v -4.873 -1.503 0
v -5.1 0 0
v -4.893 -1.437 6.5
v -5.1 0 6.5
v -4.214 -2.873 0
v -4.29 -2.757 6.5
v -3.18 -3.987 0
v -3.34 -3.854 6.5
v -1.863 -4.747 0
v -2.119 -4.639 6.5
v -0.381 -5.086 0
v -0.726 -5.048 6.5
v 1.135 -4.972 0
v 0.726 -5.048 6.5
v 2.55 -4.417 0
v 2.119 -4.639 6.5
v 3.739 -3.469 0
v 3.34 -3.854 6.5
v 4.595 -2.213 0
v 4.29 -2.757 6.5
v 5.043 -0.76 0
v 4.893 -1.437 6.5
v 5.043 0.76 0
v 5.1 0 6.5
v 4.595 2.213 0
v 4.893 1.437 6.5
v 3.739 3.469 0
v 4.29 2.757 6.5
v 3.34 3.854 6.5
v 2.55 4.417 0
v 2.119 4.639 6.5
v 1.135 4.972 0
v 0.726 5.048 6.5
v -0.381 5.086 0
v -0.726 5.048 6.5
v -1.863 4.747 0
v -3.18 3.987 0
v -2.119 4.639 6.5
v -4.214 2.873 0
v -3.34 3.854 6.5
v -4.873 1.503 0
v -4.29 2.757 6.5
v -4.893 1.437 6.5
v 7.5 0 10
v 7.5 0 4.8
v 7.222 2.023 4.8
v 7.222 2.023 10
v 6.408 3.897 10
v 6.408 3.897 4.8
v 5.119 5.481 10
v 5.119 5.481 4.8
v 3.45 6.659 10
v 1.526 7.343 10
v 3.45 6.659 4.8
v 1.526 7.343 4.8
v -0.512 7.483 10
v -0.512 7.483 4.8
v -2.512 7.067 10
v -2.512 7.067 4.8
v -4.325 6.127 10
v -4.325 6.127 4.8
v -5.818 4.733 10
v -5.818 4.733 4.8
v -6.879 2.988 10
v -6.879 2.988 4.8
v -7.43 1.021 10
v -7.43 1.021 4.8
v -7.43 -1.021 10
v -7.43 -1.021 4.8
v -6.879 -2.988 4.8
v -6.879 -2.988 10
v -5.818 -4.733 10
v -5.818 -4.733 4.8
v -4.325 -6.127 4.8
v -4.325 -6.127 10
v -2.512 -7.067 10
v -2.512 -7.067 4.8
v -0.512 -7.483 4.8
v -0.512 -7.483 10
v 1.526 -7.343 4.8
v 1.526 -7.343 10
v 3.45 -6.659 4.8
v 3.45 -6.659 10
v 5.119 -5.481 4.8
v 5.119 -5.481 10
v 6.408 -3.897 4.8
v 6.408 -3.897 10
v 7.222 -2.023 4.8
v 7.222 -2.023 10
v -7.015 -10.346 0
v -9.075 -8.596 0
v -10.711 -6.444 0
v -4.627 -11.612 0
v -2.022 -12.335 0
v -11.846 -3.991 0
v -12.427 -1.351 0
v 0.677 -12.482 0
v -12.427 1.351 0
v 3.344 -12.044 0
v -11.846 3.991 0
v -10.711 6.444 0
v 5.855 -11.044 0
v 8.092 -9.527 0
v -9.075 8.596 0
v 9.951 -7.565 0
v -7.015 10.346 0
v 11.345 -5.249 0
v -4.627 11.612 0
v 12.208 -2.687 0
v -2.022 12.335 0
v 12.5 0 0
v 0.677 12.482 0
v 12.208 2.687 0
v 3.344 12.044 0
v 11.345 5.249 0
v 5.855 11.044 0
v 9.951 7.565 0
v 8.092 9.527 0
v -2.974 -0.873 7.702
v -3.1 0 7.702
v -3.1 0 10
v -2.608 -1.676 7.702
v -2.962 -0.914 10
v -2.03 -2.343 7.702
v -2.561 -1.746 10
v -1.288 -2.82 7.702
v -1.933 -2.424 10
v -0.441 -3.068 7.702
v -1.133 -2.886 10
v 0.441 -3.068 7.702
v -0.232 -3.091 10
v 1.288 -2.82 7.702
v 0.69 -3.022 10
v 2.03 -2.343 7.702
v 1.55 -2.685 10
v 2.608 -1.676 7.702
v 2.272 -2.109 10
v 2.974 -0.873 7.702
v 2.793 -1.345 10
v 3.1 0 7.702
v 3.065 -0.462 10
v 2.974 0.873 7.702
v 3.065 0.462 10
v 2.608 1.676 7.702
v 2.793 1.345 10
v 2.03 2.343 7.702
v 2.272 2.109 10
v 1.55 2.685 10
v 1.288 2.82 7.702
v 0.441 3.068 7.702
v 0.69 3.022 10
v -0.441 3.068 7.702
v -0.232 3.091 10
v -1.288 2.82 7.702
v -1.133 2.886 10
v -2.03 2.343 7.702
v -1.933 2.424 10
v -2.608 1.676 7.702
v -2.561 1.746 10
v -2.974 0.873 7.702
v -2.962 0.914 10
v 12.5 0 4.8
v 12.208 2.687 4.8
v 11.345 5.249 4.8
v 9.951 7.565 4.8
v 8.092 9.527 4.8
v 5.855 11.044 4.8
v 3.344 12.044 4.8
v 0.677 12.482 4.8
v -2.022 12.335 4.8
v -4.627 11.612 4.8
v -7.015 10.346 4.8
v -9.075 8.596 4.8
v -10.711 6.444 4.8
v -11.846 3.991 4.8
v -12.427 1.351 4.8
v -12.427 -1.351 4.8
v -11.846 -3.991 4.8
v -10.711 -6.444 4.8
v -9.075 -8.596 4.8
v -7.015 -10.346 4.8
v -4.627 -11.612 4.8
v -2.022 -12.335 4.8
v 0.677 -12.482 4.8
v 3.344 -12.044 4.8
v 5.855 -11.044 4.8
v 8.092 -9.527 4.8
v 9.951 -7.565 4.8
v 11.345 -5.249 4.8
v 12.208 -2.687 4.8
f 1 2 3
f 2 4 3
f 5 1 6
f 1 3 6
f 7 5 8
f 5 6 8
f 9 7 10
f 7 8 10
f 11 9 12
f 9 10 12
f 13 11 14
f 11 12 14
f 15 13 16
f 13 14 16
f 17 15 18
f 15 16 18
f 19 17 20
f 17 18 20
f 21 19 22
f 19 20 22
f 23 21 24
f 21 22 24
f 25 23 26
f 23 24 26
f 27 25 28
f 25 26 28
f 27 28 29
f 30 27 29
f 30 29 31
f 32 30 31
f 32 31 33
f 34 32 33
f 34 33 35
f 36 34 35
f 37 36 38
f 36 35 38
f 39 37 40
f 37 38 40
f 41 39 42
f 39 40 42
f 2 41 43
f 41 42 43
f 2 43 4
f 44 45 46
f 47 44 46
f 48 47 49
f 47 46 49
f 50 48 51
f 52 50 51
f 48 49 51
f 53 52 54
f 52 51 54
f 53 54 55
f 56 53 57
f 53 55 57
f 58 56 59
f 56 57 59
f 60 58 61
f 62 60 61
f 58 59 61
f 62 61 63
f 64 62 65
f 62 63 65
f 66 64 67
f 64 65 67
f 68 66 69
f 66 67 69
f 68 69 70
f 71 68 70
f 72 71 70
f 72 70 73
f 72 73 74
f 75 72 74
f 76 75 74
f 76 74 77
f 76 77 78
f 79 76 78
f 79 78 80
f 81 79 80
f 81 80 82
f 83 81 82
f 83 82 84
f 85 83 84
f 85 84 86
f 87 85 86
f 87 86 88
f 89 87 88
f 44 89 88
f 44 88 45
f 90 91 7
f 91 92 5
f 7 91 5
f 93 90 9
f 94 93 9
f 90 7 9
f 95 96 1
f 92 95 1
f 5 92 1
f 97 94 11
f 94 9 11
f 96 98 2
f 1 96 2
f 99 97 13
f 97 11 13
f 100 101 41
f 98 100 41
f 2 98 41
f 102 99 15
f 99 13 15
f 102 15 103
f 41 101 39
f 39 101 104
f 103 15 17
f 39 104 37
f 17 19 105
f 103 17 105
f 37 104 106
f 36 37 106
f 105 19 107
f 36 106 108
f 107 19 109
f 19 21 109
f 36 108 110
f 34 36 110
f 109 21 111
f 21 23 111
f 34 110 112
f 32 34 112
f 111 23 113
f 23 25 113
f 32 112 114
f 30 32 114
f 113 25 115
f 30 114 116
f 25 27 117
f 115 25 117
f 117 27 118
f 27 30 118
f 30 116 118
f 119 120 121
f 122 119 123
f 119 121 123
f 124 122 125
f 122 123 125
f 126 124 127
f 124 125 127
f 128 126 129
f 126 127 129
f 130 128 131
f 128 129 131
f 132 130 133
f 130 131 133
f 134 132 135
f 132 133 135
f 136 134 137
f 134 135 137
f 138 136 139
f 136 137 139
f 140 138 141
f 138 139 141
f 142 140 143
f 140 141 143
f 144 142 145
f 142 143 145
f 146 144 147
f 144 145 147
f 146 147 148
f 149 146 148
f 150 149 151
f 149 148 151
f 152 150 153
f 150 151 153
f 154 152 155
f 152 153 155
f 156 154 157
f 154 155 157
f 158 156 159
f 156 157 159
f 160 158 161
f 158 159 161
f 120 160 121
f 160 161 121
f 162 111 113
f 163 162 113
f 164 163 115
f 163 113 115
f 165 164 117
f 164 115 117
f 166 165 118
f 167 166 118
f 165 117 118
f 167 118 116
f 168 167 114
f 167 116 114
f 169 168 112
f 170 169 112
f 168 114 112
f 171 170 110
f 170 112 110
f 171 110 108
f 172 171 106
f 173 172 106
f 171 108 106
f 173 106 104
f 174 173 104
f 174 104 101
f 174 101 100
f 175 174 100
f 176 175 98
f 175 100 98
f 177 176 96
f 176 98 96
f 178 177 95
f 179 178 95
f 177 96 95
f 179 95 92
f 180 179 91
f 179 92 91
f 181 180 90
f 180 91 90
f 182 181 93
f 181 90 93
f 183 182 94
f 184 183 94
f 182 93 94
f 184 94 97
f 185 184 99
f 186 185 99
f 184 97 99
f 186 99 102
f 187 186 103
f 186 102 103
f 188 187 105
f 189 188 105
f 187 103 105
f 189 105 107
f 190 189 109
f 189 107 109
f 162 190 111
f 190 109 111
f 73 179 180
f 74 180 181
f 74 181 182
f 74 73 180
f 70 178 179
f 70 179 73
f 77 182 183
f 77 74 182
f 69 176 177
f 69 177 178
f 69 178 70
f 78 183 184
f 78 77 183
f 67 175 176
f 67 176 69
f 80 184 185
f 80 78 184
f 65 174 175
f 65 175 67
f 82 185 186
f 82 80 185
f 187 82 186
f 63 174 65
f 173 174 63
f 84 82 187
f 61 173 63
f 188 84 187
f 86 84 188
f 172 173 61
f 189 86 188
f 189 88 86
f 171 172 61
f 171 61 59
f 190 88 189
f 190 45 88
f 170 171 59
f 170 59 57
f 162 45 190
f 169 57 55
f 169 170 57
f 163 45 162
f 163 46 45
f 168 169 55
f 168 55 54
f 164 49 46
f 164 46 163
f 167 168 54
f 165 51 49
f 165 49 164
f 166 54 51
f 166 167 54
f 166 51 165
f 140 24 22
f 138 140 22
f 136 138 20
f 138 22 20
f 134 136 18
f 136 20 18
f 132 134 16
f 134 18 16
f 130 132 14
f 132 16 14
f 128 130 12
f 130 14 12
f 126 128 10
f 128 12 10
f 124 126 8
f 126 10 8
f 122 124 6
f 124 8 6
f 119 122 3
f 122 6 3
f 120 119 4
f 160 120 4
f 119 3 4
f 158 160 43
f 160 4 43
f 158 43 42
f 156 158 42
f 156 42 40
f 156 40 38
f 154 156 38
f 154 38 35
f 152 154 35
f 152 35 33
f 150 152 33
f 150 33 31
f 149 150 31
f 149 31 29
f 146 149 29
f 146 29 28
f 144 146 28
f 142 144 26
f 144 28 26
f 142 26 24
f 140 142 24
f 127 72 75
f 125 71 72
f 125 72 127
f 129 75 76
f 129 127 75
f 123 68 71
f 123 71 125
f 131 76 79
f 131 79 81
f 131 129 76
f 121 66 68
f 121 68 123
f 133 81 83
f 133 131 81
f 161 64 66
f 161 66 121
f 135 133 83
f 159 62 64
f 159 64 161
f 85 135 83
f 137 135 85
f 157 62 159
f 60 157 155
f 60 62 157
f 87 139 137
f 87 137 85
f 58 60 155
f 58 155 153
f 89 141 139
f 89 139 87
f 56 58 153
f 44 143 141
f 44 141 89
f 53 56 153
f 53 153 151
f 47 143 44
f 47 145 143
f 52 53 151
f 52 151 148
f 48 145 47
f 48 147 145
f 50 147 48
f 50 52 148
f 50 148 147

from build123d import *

# Parameters (mm, degrees)
F0_R     = 7.5
F1_DEPTH = 10
F0_R_2   = 12.5
F2_DEPTH = 4.8
F3_D     = 6.2
F3_DEPTH = 10
F3_TIP   = 1.862667919
F4_D     = 10.2
F4_DEPTH = 6.5
F4_TIP   = 3.064389157


with BuildPart() as f1:
    # F0 (on Top) → F1 (new body)
    with BuildSketch(Plane.XY):
        Circle(F0_R)
    extrude(amount=F1_DEPTH)

    # F0 (on Top) → F2 (join)
    with BuildSketch(Plane.XY):
        Circle(F0_R_2)
        Circle(F0_R, mode=Mode.SUBTRACT)
    extrude(amount=F2_DEPTH)

    # F3
    with Locations(Plane(origin=(0, 0, 0), x_dir=(1, 0, 0), z_dir=(0, 0, -1))):
        with Locations((0, 0)):
            Hole(F3_D / 2, depth=F3_DEPTH)
            with Locations((0, 0, -(F3_DEPTH + F3_TIP / 2))):  # 118° drill point
                Cone(0, F3_D / 2, F3_TIP, mode=Mode.SUBTRACT)

    # F4
    with Locations(Plane(origin=(0, 0, 0), x_dir=(1, 0, 0), z_dir=(0, 0, -1))):
        with Locations((0, 0)):
            Hole(F4_D / 2, depth=F4_DEPTH)
            with Locations((0, 0, -(F4_DEPTH + F4_TIP / 2))):  # 118° drill point
                Cone(0, F4_D / 2, F4_TIP, mode=Mode.SUBTRACT)


solid = f1.part
